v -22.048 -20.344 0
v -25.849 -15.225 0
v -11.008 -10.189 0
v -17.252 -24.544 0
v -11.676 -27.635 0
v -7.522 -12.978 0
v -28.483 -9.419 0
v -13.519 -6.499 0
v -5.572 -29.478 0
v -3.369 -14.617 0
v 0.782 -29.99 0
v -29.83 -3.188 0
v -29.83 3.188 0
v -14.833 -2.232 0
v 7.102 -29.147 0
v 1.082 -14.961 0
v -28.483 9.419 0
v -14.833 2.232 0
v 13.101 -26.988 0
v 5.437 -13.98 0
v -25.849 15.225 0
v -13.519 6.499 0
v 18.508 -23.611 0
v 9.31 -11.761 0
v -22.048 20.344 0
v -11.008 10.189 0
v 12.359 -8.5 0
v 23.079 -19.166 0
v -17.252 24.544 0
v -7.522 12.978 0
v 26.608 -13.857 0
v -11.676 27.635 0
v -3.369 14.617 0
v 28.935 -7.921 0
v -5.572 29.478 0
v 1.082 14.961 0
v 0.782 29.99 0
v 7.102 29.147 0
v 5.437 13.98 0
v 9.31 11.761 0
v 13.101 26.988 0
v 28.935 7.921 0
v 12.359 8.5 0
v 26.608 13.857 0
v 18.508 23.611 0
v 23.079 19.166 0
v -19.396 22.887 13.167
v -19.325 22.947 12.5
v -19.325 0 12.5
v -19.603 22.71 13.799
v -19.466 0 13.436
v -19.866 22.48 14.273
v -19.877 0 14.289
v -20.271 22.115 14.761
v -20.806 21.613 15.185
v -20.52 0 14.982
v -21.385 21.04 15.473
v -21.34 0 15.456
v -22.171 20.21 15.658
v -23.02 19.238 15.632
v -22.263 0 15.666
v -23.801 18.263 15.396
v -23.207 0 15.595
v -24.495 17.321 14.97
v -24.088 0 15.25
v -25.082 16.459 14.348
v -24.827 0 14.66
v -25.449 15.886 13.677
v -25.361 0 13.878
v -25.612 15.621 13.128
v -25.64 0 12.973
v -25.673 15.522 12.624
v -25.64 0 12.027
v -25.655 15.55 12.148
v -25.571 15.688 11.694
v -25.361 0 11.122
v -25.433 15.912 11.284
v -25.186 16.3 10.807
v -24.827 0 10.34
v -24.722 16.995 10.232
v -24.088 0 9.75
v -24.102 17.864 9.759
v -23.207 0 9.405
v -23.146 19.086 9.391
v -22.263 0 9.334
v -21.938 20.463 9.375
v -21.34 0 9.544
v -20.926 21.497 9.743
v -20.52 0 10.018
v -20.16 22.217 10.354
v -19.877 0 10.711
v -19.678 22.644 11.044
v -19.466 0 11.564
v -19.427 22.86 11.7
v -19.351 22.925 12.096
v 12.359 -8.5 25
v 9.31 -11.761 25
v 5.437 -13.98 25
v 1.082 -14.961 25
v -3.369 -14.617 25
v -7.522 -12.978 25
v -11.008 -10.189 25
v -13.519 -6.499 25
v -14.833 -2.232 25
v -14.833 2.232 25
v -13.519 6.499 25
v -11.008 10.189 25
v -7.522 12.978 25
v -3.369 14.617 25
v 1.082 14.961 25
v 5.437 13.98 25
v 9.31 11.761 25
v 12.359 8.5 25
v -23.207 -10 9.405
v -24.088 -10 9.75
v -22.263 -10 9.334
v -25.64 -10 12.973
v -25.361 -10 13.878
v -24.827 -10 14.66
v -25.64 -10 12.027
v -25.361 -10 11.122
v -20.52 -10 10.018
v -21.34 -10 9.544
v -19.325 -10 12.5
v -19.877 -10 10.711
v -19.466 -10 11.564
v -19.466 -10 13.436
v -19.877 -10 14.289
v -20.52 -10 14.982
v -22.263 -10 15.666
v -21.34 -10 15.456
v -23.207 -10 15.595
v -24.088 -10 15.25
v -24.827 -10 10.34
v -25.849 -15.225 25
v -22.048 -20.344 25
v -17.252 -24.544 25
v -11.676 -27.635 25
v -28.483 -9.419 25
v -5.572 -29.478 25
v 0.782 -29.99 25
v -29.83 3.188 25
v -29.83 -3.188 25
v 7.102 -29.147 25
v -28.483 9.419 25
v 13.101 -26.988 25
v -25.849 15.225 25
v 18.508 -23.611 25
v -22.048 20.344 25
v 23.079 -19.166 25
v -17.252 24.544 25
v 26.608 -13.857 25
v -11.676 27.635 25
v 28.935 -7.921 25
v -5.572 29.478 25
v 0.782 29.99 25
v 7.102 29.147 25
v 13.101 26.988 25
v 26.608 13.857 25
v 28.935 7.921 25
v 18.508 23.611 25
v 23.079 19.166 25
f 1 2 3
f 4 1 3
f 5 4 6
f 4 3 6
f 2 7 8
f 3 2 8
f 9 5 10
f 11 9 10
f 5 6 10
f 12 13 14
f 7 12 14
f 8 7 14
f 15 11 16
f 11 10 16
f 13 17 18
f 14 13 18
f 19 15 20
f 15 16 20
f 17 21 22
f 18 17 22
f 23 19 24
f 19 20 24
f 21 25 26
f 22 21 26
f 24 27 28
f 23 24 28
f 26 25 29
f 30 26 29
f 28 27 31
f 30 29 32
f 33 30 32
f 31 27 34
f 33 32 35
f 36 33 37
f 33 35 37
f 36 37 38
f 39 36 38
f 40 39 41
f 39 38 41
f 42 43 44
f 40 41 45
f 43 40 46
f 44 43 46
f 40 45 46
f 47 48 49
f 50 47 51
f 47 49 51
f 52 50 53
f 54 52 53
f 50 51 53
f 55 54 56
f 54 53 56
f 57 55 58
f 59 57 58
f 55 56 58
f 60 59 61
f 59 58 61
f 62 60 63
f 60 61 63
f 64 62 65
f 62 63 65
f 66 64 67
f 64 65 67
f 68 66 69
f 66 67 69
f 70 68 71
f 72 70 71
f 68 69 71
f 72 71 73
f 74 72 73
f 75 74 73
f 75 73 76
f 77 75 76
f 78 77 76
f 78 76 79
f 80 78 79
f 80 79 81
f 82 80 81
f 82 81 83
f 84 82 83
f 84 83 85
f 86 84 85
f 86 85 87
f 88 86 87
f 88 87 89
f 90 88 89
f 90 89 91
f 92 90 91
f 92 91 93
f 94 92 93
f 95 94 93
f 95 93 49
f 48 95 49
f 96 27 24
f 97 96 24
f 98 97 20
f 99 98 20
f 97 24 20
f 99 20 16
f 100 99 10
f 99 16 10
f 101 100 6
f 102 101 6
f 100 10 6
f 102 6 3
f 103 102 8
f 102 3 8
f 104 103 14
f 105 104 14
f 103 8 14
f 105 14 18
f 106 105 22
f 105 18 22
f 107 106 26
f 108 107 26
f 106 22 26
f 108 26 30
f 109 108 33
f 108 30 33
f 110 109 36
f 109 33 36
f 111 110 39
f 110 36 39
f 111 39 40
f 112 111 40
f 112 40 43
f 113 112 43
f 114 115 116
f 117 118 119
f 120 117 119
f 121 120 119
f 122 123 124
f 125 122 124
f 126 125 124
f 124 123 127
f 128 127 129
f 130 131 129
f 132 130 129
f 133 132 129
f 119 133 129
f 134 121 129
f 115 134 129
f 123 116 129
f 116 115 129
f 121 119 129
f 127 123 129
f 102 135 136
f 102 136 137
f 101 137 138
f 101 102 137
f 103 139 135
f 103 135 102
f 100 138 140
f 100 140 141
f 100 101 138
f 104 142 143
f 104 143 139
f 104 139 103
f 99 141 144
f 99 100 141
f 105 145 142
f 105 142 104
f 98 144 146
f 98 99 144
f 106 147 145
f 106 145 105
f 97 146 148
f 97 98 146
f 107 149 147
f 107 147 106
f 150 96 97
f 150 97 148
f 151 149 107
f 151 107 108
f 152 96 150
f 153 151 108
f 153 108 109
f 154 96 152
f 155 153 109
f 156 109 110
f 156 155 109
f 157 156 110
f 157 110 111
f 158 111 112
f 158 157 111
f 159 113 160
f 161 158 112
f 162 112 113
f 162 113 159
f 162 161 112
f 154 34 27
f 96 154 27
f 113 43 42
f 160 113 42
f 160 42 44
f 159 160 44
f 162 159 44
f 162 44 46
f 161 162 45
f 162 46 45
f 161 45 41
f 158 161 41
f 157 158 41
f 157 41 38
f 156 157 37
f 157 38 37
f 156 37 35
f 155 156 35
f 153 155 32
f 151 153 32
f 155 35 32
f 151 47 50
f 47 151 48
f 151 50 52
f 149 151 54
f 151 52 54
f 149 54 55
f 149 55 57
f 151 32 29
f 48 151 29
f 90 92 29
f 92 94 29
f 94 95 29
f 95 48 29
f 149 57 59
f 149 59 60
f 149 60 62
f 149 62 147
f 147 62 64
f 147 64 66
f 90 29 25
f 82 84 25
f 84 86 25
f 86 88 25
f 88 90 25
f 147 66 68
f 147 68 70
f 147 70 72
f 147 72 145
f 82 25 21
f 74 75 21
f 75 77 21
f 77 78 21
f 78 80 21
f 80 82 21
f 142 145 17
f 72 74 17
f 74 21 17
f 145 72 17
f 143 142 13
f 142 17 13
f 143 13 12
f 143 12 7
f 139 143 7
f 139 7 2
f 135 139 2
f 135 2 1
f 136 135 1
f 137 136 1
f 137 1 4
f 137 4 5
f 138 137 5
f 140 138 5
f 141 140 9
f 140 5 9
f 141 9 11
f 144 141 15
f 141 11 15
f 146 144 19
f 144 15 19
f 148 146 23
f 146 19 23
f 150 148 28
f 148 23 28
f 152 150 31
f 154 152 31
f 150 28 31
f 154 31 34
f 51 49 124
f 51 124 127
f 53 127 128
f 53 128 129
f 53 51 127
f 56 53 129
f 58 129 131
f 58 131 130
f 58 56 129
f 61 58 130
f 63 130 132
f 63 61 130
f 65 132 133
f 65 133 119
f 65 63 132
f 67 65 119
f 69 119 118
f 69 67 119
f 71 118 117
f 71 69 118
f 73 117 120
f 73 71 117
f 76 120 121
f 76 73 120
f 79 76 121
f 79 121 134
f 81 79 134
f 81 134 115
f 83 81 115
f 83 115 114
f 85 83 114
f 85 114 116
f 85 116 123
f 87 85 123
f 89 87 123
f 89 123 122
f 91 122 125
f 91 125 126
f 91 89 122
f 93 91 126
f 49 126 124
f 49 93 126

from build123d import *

# Parameters (mm, degrees)
F1_DEPTH      = 25
F2_R          = 3.175
F3_DEPTH      = 10
F3_DEPTH_BACK = 30.001


with BuildPart() as f1:
    # F0 (on Top) → F1 (new body)
    with BuildSketch(Plane.XY):
        with BuildLine():
            ThreePointArc((12.359207, -8.5), (-15, 0), (12.359207, 8.5))
            Line((12.359207, 8.5), (28.935366, 7.921148))
            ThreePointArc((28.935366, 7.921148), (-30, 0), (28.935366, -7.921148))
            Line((28.935366, -7.921148), (12.359207, -8.5))
        make_face()
    extrude(amount=F1_DEPTH)

    # F2 (on Front) → F3 (cut, two sides)
    with BuildSketch(Plane.XZ) as f3_sk:
        with Locations((-22.5, 12.5)):
            Circle(F2_R)
    extrude(amount=F3_DEPTH, mode=Mode.SUBTRACT)
    extrude(f3_sk.sketch, amount=-F3_DEPTH_BACK, mode=Mode.SUBTRACT)


solid = f1.part
